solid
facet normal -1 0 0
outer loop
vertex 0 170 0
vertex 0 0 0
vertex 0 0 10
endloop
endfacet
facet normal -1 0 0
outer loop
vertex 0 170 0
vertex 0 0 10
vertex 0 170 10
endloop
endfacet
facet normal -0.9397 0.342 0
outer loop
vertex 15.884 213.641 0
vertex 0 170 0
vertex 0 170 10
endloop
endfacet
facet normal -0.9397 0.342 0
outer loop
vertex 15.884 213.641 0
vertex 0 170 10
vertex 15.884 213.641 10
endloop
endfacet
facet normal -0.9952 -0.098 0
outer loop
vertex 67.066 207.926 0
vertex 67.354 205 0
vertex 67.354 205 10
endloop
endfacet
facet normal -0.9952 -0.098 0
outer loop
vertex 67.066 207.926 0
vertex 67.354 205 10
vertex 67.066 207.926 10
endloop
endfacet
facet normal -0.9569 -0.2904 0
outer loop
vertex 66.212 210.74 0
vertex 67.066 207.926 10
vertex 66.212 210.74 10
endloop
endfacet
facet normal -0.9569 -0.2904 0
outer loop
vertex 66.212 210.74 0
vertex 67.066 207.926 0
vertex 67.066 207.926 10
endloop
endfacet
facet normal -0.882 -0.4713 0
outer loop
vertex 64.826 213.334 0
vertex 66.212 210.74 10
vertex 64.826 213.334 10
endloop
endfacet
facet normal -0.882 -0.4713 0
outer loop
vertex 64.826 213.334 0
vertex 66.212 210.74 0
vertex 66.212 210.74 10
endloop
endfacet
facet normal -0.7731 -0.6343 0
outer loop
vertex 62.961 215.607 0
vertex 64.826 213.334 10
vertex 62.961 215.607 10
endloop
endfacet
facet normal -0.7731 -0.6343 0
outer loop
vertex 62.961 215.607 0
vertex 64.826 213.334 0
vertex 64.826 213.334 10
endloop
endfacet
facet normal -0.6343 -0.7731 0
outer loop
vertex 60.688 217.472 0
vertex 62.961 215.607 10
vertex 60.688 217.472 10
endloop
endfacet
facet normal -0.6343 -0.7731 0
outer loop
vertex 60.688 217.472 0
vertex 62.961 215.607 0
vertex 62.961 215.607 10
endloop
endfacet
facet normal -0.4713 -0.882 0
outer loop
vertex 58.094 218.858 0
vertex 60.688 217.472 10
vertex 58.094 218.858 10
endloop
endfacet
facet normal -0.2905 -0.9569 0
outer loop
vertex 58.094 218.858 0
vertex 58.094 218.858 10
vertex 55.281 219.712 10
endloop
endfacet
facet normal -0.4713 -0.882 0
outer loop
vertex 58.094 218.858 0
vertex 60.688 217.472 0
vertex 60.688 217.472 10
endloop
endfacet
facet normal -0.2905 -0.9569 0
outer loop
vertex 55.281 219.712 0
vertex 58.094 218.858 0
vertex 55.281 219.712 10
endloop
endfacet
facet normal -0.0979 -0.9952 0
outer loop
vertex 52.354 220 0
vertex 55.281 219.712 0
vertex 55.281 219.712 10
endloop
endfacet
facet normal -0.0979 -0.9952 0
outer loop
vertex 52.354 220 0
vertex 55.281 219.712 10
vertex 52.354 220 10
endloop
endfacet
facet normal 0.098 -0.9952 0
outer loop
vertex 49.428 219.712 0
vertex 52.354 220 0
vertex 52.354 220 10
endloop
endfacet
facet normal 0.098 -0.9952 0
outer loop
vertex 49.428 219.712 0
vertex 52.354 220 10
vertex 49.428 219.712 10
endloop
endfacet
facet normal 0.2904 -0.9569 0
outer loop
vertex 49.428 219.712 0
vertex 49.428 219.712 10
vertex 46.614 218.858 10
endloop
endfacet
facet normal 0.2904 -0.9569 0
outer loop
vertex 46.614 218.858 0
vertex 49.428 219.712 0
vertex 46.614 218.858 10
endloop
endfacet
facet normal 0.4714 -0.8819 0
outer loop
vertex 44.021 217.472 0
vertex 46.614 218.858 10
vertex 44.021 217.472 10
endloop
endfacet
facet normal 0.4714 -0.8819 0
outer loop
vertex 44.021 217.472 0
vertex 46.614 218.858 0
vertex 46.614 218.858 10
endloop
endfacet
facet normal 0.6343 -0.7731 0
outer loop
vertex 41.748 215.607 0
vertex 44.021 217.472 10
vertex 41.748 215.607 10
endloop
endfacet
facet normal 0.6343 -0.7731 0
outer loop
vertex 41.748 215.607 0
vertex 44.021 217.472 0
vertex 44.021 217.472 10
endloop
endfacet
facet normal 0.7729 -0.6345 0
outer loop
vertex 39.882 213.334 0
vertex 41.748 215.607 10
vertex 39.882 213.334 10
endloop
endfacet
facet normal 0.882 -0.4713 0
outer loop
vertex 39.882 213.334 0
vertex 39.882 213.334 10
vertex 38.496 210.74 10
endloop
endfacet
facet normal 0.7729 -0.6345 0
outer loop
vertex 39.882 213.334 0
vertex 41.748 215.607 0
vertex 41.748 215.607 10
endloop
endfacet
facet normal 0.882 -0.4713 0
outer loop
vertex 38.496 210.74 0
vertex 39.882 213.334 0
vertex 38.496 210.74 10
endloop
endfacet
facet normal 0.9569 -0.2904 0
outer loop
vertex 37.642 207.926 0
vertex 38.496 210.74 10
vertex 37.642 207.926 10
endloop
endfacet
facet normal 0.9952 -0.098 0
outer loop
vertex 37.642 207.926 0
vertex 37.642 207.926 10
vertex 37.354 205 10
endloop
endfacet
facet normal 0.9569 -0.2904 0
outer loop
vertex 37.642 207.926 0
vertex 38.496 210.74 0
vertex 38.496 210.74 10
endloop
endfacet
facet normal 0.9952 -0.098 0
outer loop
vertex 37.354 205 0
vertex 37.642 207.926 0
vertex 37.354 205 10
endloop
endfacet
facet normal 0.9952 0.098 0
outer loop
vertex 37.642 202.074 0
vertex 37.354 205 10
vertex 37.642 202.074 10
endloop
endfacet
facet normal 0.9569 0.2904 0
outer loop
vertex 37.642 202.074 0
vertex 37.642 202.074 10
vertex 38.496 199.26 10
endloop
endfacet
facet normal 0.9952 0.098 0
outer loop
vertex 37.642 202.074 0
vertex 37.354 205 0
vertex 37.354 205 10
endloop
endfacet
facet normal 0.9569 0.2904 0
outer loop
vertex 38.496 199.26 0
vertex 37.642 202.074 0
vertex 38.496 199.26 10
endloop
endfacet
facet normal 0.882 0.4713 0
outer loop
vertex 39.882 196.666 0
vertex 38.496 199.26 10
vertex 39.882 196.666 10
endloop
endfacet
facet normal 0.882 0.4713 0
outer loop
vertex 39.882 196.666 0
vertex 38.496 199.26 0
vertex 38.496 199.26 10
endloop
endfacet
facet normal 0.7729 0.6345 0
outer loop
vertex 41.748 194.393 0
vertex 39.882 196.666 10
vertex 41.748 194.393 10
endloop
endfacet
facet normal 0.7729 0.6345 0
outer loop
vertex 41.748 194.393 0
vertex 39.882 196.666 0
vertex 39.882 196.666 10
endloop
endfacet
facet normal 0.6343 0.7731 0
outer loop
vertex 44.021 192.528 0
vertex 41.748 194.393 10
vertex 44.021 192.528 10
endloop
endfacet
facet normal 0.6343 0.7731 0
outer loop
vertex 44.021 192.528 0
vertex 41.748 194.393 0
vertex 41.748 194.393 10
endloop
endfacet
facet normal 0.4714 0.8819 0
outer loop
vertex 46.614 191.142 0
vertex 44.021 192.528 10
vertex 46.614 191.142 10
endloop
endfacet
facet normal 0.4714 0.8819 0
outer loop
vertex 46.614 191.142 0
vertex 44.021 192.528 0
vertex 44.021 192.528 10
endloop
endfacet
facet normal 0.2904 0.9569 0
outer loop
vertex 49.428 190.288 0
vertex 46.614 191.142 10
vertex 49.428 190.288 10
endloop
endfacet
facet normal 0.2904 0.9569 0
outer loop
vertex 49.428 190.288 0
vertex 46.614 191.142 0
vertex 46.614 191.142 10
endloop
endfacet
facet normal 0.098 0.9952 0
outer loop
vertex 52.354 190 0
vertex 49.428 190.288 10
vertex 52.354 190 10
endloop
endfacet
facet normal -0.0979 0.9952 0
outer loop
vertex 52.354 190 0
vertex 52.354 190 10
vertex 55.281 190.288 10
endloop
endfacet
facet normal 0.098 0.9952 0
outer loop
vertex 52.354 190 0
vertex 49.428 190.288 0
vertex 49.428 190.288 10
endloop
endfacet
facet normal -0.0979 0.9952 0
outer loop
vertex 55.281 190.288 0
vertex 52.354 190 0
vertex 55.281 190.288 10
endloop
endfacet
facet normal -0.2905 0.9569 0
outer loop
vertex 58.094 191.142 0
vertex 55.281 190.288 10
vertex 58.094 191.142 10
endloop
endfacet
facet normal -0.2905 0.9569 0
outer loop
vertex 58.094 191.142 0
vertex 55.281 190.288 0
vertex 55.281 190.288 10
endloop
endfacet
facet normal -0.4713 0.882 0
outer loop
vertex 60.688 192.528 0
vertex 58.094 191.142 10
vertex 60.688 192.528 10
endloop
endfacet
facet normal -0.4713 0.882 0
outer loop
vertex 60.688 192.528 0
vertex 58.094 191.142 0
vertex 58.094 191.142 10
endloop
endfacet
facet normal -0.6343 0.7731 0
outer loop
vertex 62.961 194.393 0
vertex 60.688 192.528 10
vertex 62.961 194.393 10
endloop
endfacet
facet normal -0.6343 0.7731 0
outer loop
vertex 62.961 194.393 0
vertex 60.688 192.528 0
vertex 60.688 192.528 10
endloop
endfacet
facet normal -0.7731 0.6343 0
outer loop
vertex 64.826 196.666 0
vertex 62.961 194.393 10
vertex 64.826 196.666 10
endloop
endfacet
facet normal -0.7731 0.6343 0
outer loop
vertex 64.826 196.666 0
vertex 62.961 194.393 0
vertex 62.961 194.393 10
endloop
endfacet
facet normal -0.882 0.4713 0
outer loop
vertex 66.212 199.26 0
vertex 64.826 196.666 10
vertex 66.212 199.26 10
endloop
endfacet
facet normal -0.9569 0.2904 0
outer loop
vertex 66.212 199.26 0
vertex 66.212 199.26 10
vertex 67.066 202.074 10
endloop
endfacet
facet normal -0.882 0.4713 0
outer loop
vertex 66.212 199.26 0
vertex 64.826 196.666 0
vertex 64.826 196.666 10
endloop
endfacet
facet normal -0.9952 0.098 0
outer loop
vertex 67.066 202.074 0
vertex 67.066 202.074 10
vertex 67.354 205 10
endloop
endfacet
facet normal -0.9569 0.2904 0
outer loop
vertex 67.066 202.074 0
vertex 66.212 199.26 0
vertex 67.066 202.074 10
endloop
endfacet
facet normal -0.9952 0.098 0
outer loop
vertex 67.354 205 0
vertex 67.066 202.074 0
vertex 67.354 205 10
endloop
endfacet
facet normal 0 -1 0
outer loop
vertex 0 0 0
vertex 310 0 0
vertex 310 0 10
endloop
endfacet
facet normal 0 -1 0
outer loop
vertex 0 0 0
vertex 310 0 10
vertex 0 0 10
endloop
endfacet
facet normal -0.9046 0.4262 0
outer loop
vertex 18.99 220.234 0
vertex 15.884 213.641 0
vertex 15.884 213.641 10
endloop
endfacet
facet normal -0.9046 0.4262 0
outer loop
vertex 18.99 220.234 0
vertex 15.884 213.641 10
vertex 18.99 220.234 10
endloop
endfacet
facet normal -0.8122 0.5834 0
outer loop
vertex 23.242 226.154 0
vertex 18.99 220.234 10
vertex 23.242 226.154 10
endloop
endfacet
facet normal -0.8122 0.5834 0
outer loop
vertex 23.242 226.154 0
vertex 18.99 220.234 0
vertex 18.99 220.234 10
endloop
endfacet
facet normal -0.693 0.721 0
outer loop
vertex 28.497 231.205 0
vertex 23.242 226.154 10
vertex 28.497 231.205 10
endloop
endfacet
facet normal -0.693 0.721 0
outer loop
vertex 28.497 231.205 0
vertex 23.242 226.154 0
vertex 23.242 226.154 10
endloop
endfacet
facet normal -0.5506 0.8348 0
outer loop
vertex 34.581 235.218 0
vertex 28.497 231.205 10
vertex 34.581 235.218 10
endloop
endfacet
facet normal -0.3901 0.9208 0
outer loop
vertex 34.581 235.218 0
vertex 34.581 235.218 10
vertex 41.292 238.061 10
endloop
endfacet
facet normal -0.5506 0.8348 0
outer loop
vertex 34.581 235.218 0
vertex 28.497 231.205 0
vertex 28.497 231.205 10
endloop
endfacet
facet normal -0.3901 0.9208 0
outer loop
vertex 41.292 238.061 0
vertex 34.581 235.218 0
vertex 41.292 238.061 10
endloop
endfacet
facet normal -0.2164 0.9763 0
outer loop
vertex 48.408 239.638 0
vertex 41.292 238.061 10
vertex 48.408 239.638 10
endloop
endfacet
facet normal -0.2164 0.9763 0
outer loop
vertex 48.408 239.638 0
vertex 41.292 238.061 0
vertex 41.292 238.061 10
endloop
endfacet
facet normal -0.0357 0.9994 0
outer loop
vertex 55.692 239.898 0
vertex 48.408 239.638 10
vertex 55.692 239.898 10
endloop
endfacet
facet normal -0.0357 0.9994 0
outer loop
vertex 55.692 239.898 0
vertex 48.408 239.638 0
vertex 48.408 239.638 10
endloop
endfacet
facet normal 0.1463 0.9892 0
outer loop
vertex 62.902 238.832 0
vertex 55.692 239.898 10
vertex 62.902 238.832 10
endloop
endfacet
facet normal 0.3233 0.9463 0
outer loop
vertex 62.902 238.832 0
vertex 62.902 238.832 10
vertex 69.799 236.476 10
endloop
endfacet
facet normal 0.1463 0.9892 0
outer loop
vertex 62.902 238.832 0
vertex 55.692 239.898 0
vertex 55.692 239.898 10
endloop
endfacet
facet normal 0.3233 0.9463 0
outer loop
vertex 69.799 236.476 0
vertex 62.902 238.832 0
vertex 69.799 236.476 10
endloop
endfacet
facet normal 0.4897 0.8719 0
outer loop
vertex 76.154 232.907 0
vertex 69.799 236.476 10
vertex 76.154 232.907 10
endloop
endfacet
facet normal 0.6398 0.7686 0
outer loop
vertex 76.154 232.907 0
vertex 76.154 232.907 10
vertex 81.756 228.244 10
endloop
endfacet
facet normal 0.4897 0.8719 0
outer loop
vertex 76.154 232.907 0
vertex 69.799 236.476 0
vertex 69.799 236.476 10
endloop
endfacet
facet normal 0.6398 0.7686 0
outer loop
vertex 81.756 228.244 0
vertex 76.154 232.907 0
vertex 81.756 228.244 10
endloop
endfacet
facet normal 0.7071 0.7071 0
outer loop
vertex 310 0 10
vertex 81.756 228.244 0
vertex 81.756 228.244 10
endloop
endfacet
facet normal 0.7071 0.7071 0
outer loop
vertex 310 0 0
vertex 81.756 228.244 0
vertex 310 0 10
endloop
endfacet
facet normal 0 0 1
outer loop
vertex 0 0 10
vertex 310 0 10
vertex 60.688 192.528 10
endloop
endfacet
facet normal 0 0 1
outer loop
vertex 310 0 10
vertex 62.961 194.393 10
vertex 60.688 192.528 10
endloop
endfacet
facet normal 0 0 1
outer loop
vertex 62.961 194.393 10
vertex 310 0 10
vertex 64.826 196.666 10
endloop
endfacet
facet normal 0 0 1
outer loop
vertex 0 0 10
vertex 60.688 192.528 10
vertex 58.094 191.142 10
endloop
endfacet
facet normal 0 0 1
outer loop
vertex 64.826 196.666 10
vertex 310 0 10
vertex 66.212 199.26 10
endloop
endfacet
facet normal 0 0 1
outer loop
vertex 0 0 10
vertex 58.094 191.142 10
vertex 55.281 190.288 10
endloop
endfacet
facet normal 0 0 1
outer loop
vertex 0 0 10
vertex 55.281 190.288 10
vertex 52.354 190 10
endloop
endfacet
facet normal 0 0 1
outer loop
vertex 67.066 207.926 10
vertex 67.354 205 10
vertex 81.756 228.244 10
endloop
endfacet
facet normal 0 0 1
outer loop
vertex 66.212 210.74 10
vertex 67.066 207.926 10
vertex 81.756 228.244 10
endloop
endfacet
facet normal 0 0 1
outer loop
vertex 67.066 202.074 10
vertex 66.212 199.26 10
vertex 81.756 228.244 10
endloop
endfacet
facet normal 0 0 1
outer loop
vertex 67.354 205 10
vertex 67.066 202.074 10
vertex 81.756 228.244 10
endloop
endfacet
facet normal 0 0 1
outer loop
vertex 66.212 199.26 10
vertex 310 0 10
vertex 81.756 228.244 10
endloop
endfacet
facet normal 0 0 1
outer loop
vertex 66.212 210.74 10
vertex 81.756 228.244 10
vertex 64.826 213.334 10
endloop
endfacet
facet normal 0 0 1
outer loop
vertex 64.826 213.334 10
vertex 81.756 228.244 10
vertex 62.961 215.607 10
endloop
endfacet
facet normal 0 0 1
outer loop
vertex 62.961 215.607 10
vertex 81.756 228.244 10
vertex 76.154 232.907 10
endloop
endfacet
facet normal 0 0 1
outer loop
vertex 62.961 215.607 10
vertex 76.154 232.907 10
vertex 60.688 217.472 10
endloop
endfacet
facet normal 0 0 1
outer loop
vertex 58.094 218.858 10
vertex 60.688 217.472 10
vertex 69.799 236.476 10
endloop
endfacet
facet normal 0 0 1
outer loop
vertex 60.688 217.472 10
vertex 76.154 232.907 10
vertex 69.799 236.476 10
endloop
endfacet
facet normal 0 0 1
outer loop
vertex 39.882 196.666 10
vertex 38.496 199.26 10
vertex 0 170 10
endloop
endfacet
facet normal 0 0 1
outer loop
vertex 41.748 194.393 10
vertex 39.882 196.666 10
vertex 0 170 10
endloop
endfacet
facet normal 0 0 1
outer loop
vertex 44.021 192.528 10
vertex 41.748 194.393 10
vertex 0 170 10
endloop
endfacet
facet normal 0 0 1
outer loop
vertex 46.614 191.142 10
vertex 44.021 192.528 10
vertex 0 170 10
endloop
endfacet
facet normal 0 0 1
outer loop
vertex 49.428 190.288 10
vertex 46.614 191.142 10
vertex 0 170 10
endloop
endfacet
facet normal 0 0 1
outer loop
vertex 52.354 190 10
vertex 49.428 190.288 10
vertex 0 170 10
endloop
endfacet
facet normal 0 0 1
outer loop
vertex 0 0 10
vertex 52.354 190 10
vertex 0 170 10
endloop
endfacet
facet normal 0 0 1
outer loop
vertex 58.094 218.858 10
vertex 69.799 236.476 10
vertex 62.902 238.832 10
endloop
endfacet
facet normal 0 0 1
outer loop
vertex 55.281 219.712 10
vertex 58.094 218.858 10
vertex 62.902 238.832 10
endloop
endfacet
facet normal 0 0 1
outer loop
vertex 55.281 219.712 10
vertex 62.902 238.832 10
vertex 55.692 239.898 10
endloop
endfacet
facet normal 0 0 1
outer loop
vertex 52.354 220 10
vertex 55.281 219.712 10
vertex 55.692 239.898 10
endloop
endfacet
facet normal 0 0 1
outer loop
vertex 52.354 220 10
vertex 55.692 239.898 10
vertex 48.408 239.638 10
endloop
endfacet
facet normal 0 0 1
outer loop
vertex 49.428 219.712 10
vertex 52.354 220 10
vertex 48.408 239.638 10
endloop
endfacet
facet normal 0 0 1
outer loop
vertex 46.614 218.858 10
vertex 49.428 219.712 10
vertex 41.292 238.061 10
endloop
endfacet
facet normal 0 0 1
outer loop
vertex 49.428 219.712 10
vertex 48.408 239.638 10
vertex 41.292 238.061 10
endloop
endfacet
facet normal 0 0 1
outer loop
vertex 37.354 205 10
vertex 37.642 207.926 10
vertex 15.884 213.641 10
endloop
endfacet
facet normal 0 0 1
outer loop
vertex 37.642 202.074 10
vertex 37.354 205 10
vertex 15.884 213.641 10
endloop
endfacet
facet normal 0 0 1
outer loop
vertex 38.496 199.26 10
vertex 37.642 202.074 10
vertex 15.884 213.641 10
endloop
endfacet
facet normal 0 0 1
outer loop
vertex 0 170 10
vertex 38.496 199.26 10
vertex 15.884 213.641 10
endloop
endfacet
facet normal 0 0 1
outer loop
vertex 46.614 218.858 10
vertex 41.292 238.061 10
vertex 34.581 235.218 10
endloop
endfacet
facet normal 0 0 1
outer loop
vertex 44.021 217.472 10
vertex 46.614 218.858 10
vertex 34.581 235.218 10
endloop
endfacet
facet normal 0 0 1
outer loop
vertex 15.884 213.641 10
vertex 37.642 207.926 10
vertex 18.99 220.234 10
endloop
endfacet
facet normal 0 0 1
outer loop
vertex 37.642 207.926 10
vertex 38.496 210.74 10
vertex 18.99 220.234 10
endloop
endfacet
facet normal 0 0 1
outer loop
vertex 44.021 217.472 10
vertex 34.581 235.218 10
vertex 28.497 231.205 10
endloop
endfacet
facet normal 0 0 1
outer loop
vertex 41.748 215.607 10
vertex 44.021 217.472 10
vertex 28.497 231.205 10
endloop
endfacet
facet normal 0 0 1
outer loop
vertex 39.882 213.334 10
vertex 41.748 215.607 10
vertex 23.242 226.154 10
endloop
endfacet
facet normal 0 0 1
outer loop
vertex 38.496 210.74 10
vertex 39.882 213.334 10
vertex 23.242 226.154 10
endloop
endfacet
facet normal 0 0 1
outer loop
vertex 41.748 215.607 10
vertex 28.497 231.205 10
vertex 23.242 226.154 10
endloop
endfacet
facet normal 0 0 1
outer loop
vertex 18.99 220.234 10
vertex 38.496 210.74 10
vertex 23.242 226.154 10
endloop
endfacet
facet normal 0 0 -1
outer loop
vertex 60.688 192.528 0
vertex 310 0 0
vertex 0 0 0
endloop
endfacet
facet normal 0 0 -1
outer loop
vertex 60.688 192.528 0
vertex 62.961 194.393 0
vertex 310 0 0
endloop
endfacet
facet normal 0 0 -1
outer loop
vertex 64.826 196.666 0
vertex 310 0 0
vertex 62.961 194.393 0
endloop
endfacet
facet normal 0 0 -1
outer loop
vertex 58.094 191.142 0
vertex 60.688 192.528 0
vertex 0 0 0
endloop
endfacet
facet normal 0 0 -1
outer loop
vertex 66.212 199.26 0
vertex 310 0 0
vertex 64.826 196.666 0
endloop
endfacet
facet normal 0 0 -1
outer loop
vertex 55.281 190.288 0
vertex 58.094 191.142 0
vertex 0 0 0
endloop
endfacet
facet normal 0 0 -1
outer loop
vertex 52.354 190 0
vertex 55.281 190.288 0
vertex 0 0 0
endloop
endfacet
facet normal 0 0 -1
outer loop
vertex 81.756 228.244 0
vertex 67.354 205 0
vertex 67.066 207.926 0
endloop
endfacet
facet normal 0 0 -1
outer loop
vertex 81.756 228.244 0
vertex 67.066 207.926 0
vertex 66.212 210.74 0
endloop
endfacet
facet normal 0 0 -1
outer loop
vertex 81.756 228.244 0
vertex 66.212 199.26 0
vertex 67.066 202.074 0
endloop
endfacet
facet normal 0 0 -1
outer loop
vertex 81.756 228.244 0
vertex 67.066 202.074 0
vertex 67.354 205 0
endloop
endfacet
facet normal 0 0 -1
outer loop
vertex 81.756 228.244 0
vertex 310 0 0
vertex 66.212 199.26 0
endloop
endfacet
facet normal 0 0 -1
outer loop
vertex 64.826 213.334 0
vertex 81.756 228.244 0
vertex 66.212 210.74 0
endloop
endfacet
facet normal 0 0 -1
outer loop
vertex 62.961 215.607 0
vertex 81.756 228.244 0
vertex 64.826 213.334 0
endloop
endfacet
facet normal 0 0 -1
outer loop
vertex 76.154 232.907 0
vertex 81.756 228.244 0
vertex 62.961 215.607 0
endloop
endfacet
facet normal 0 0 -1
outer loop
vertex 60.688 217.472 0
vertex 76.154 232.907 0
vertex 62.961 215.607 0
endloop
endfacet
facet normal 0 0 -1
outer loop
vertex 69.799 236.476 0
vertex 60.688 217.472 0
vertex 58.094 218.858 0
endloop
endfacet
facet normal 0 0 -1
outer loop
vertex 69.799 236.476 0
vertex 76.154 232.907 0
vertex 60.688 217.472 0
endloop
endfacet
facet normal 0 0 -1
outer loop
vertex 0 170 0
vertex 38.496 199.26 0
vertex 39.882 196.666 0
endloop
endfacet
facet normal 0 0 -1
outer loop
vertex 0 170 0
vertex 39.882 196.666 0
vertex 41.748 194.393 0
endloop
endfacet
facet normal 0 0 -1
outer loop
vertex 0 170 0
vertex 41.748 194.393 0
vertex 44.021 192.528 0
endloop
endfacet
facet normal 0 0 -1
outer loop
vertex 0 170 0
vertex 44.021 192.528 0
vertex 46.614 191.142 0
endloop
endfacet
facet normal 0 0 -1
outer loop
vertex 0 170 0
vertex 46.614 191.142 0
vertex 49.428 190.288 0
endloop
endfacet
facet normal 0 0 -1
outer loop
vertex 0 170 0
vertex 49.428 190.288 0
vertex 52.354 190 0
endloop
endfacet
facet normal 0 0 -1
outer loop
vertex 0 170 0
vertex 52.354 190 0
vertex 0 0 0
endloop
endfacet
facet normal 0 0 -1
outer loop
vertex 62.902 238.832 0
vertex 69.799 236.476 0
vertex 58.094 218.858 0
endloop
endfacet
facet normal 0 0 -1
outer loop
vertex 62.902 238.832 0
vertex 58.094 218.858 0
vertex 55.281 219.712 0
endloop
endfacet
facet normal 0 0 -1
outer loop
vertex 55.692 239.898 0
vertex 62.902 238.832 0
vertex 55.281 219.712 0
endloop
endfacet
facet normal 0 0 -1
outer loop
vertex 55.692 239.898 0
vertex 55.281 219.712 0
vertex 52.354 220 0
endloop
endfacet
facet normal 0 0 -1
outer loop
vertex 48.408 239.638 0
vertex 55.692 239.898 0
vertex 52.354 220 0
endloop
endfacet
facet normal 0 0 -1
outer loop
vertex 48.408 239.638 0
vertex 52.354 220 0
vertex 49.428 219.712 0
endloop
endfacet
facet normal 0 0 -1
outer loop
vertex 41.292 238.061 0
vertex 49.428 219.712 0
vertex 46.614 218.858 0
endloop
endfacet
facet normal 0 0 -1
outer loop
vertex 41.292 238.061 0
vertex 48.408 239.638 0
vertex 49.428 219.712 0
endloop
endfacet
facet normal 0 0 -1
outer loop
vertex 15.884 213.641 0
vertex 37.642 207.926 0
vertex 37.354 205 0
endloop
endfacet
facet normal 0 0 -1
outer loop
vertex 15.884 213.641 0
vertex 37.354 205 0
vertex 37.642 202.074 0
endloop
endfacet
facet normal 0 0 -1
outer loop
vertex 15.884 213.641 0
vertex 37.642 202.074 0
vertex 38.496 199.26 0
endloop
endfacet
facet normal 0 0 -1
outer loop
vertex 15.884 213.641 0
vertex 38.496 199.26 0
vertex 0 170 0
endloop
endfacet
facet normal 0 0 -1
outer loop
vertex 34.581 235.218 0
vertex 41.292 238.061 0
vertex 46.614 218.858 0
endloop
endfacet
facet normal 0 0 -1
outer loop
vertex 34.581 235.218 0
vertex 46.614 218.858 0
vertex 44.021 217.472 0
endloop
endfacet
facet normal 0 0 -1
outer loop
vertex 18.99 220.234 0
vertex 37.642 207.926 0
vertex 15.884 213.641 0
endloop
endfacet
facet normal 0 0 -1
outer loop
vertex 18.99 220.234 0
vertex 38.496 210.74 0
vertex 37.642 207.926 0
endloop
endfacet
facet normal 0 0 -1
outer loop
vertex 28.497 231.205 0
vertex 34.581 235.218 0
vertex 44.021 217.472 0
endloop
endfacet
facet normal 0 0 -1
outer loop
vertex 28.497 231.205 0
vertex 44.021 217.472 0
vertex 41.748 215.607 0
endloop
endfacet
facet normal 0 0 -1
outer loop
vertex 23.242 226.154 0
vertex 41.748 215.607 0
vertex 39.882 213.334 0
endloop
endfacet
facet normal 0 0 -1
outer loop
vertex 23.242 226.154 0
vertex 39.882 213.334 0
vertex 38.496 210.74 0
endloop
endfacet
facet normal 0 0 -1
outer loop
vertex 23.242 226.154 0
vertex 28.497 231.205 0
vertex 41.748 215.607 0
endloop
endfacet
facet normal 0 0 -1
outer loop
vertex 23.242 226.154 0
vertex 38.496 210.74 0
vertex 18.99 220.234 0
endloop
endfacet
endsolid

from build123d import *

# Parameters (mm, degrees)
ESQUISSE1_R        = 15
BOSS_EXTRU_1_DEPTH = 10


with BuildPart() as part:
    # Esquisse1 → Boss.-Extru.1 (new body)
    with BuildSketch(Plane.XY):
        with BuildLine():
            Line((0, 0), (0, 170))
            Line((0, 170), (15.883900487, 213.64065792))
            ThreePointArc((15.883900487, 213.64065792), (44.814020761, 239.011692472), (81.755876566, 228.244123434))
            Line((81.755876566, 228.244123434), (90, 220))
            Line((90, 220), (140, 170))
            Line((140, 170), (310, 0))
            Line((310, 0), (0, 0))
        make_face()
        with Locations((52.354231449, 205)):
            Circle(ESQUISSE1_R, mode=Mode.SUBTRACT)
    extrude(amount=BOSS_EXTRU_1_DEPTH)


solid = part.part
